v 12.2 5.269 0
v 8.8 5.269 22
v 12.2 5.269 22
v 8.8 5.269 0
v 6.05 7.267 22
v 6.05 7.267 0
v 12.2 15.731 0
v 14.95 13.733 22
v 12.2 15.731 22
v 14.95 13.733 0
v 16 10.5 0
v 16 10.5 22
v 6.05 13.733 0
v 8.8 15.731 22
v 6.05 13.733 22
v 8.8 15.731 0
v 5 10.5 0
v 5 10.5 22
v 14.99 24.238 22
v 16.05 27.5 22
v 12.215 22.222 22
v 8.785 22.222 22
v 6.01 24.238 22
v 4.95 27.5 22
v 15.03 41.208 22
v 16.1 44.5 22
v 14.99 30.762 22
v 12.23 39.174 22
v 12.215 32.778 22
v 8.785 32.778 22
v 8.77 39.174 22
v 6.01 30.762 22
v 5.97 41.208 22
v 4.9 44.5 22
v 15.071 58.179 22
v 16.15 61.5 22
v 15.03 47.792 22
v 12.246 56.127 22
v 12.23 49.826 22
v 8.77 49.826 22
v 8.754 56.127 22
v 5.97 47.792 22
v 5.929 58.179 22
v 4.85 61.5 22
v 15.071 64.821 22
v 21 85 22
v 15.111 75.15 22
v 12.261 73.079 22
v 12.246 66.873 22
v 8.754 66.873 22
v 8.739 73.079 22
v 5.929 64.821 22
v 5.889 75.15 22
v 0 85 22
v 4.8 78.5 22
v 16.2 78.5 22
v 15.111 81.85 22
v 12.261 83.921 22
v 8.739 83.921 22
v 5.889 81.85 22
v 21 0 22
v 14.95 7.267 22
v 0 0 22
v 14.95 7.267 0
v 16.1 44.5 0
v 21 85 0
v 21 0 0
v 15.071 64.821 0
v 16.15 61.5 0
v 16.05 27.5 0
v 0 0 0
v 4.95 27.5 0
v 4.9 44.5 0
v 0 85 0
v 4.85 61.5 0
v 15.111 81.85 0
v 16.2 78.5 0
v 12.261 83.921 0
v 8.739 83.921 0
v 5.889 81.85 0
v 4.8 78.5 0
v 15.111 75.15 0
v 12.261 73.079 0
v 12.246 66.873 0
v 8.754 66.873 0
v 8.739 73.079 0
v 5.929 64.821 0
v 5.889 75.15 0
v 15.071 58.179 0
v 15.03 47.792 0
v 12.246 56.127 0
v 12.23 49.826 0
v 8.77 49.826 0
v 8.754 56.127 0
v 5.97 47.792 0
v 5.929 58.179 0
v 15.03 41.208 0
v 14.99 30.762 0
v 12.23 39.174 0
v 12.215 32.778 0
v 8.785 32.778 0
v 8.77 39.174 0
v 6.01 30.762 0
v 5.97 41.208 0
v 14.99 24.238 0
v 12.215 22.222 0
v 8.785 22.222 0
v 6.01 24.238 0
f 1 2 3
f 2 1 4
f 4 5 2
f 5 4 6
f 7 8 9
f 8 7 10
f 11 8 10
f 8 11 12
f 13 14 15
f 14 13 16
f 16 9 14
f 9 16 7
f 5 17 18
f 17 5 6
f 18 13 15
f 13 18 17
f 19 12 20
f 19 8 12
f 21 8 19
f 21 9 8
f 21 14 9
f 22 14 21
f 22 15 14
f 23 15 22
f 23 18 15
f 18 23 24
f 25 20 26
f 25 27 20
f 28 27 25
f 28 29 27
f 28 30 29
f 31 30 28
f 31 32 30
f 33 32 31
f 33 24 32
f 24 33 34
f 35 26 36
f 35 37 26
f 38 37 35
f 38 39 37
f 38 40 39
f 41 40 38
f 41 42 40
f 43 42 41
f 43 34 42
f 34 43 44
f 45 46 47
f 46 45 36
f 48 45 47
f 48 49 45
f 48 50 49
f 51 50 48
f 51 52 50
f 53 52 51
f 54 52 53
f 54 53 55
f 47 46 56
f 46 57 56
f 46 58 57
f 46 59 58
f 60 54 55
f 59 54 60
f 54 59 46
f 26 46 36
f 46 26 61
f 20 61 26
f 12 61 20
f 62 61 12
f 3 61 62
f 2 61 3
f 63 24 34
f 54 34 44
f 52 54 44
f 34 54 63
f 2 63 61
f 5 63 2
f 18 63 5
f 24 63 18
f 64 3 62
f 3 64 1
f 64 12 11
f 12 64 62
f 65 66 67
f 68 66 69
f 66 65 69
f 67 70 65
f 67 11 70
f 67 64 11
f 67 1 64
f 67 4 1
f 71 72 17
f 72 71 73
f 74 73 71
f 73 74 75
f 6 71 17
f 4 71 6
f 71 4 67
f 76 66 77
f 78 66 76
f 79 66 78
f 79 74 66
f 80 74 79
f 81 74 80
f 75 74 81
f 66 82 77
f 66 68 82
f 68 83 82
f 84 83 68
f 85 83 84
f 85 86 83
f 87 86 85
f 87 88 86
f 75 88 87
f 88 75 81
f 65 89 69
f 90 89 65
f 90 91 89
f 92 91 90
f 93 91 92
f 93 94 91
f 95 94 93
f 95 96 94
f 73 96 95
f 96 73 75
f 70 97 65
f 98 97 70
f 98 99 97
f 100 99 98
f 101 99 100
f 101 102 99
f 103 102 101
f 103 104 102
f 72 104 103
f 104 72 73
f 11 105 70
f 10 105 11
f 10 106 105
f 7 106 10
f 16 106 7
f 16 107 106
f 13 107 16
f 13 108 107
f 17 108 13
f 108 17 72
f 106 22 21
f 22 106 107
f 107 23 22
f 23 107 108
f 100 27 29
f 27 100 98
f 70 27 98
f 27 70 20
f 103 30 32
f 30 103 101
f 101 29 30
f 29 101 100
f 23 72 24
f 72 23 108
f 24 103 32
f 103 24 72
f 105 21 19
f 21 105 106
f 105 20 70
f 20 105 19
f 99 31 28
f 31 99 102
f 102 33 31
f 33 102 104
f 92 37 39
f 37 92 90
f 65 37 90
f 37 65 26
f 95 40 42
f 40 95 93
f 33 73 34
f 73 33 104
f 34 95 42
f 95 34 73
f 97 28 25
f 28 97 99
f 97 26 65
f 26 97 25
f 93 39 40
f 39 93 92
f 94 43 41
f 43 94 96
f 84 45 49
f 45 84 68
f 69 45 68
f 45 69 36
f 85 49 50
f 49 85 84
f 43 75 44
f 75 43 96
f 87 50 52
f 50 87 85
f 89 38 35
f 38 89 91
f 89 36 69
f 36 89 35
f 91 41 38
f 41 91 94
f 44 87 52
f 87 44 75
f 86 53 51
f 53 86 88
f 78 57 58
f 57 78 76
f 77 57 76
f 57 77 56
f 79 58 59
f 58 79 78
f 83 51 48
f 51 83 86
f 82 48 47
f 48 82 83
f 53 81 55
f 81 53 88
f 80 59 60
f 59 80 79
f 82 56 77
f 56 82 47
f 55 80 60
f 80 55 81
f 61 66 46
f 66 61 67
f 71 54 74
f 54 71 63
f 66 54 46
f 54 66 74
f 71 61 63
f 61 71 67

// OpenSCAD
pen_d = 12.7;   // 11.8 at the top
nib_d = 3.2;  // 2.5

scale = 1.1;

height = 1;

$fn=10;

pad = 5;
z = 22;
num = 5;
d = 11;
x = d+2*pad;
y = d*num + pad*(num+1);
dy = y/(num);

difference() {
  cube([x,y,z]);
  for(i=[0:num-1])
    translate([x/2, dy*i+d/2+pad]) cylinder(d=d+0.1*i,h=z);
}
